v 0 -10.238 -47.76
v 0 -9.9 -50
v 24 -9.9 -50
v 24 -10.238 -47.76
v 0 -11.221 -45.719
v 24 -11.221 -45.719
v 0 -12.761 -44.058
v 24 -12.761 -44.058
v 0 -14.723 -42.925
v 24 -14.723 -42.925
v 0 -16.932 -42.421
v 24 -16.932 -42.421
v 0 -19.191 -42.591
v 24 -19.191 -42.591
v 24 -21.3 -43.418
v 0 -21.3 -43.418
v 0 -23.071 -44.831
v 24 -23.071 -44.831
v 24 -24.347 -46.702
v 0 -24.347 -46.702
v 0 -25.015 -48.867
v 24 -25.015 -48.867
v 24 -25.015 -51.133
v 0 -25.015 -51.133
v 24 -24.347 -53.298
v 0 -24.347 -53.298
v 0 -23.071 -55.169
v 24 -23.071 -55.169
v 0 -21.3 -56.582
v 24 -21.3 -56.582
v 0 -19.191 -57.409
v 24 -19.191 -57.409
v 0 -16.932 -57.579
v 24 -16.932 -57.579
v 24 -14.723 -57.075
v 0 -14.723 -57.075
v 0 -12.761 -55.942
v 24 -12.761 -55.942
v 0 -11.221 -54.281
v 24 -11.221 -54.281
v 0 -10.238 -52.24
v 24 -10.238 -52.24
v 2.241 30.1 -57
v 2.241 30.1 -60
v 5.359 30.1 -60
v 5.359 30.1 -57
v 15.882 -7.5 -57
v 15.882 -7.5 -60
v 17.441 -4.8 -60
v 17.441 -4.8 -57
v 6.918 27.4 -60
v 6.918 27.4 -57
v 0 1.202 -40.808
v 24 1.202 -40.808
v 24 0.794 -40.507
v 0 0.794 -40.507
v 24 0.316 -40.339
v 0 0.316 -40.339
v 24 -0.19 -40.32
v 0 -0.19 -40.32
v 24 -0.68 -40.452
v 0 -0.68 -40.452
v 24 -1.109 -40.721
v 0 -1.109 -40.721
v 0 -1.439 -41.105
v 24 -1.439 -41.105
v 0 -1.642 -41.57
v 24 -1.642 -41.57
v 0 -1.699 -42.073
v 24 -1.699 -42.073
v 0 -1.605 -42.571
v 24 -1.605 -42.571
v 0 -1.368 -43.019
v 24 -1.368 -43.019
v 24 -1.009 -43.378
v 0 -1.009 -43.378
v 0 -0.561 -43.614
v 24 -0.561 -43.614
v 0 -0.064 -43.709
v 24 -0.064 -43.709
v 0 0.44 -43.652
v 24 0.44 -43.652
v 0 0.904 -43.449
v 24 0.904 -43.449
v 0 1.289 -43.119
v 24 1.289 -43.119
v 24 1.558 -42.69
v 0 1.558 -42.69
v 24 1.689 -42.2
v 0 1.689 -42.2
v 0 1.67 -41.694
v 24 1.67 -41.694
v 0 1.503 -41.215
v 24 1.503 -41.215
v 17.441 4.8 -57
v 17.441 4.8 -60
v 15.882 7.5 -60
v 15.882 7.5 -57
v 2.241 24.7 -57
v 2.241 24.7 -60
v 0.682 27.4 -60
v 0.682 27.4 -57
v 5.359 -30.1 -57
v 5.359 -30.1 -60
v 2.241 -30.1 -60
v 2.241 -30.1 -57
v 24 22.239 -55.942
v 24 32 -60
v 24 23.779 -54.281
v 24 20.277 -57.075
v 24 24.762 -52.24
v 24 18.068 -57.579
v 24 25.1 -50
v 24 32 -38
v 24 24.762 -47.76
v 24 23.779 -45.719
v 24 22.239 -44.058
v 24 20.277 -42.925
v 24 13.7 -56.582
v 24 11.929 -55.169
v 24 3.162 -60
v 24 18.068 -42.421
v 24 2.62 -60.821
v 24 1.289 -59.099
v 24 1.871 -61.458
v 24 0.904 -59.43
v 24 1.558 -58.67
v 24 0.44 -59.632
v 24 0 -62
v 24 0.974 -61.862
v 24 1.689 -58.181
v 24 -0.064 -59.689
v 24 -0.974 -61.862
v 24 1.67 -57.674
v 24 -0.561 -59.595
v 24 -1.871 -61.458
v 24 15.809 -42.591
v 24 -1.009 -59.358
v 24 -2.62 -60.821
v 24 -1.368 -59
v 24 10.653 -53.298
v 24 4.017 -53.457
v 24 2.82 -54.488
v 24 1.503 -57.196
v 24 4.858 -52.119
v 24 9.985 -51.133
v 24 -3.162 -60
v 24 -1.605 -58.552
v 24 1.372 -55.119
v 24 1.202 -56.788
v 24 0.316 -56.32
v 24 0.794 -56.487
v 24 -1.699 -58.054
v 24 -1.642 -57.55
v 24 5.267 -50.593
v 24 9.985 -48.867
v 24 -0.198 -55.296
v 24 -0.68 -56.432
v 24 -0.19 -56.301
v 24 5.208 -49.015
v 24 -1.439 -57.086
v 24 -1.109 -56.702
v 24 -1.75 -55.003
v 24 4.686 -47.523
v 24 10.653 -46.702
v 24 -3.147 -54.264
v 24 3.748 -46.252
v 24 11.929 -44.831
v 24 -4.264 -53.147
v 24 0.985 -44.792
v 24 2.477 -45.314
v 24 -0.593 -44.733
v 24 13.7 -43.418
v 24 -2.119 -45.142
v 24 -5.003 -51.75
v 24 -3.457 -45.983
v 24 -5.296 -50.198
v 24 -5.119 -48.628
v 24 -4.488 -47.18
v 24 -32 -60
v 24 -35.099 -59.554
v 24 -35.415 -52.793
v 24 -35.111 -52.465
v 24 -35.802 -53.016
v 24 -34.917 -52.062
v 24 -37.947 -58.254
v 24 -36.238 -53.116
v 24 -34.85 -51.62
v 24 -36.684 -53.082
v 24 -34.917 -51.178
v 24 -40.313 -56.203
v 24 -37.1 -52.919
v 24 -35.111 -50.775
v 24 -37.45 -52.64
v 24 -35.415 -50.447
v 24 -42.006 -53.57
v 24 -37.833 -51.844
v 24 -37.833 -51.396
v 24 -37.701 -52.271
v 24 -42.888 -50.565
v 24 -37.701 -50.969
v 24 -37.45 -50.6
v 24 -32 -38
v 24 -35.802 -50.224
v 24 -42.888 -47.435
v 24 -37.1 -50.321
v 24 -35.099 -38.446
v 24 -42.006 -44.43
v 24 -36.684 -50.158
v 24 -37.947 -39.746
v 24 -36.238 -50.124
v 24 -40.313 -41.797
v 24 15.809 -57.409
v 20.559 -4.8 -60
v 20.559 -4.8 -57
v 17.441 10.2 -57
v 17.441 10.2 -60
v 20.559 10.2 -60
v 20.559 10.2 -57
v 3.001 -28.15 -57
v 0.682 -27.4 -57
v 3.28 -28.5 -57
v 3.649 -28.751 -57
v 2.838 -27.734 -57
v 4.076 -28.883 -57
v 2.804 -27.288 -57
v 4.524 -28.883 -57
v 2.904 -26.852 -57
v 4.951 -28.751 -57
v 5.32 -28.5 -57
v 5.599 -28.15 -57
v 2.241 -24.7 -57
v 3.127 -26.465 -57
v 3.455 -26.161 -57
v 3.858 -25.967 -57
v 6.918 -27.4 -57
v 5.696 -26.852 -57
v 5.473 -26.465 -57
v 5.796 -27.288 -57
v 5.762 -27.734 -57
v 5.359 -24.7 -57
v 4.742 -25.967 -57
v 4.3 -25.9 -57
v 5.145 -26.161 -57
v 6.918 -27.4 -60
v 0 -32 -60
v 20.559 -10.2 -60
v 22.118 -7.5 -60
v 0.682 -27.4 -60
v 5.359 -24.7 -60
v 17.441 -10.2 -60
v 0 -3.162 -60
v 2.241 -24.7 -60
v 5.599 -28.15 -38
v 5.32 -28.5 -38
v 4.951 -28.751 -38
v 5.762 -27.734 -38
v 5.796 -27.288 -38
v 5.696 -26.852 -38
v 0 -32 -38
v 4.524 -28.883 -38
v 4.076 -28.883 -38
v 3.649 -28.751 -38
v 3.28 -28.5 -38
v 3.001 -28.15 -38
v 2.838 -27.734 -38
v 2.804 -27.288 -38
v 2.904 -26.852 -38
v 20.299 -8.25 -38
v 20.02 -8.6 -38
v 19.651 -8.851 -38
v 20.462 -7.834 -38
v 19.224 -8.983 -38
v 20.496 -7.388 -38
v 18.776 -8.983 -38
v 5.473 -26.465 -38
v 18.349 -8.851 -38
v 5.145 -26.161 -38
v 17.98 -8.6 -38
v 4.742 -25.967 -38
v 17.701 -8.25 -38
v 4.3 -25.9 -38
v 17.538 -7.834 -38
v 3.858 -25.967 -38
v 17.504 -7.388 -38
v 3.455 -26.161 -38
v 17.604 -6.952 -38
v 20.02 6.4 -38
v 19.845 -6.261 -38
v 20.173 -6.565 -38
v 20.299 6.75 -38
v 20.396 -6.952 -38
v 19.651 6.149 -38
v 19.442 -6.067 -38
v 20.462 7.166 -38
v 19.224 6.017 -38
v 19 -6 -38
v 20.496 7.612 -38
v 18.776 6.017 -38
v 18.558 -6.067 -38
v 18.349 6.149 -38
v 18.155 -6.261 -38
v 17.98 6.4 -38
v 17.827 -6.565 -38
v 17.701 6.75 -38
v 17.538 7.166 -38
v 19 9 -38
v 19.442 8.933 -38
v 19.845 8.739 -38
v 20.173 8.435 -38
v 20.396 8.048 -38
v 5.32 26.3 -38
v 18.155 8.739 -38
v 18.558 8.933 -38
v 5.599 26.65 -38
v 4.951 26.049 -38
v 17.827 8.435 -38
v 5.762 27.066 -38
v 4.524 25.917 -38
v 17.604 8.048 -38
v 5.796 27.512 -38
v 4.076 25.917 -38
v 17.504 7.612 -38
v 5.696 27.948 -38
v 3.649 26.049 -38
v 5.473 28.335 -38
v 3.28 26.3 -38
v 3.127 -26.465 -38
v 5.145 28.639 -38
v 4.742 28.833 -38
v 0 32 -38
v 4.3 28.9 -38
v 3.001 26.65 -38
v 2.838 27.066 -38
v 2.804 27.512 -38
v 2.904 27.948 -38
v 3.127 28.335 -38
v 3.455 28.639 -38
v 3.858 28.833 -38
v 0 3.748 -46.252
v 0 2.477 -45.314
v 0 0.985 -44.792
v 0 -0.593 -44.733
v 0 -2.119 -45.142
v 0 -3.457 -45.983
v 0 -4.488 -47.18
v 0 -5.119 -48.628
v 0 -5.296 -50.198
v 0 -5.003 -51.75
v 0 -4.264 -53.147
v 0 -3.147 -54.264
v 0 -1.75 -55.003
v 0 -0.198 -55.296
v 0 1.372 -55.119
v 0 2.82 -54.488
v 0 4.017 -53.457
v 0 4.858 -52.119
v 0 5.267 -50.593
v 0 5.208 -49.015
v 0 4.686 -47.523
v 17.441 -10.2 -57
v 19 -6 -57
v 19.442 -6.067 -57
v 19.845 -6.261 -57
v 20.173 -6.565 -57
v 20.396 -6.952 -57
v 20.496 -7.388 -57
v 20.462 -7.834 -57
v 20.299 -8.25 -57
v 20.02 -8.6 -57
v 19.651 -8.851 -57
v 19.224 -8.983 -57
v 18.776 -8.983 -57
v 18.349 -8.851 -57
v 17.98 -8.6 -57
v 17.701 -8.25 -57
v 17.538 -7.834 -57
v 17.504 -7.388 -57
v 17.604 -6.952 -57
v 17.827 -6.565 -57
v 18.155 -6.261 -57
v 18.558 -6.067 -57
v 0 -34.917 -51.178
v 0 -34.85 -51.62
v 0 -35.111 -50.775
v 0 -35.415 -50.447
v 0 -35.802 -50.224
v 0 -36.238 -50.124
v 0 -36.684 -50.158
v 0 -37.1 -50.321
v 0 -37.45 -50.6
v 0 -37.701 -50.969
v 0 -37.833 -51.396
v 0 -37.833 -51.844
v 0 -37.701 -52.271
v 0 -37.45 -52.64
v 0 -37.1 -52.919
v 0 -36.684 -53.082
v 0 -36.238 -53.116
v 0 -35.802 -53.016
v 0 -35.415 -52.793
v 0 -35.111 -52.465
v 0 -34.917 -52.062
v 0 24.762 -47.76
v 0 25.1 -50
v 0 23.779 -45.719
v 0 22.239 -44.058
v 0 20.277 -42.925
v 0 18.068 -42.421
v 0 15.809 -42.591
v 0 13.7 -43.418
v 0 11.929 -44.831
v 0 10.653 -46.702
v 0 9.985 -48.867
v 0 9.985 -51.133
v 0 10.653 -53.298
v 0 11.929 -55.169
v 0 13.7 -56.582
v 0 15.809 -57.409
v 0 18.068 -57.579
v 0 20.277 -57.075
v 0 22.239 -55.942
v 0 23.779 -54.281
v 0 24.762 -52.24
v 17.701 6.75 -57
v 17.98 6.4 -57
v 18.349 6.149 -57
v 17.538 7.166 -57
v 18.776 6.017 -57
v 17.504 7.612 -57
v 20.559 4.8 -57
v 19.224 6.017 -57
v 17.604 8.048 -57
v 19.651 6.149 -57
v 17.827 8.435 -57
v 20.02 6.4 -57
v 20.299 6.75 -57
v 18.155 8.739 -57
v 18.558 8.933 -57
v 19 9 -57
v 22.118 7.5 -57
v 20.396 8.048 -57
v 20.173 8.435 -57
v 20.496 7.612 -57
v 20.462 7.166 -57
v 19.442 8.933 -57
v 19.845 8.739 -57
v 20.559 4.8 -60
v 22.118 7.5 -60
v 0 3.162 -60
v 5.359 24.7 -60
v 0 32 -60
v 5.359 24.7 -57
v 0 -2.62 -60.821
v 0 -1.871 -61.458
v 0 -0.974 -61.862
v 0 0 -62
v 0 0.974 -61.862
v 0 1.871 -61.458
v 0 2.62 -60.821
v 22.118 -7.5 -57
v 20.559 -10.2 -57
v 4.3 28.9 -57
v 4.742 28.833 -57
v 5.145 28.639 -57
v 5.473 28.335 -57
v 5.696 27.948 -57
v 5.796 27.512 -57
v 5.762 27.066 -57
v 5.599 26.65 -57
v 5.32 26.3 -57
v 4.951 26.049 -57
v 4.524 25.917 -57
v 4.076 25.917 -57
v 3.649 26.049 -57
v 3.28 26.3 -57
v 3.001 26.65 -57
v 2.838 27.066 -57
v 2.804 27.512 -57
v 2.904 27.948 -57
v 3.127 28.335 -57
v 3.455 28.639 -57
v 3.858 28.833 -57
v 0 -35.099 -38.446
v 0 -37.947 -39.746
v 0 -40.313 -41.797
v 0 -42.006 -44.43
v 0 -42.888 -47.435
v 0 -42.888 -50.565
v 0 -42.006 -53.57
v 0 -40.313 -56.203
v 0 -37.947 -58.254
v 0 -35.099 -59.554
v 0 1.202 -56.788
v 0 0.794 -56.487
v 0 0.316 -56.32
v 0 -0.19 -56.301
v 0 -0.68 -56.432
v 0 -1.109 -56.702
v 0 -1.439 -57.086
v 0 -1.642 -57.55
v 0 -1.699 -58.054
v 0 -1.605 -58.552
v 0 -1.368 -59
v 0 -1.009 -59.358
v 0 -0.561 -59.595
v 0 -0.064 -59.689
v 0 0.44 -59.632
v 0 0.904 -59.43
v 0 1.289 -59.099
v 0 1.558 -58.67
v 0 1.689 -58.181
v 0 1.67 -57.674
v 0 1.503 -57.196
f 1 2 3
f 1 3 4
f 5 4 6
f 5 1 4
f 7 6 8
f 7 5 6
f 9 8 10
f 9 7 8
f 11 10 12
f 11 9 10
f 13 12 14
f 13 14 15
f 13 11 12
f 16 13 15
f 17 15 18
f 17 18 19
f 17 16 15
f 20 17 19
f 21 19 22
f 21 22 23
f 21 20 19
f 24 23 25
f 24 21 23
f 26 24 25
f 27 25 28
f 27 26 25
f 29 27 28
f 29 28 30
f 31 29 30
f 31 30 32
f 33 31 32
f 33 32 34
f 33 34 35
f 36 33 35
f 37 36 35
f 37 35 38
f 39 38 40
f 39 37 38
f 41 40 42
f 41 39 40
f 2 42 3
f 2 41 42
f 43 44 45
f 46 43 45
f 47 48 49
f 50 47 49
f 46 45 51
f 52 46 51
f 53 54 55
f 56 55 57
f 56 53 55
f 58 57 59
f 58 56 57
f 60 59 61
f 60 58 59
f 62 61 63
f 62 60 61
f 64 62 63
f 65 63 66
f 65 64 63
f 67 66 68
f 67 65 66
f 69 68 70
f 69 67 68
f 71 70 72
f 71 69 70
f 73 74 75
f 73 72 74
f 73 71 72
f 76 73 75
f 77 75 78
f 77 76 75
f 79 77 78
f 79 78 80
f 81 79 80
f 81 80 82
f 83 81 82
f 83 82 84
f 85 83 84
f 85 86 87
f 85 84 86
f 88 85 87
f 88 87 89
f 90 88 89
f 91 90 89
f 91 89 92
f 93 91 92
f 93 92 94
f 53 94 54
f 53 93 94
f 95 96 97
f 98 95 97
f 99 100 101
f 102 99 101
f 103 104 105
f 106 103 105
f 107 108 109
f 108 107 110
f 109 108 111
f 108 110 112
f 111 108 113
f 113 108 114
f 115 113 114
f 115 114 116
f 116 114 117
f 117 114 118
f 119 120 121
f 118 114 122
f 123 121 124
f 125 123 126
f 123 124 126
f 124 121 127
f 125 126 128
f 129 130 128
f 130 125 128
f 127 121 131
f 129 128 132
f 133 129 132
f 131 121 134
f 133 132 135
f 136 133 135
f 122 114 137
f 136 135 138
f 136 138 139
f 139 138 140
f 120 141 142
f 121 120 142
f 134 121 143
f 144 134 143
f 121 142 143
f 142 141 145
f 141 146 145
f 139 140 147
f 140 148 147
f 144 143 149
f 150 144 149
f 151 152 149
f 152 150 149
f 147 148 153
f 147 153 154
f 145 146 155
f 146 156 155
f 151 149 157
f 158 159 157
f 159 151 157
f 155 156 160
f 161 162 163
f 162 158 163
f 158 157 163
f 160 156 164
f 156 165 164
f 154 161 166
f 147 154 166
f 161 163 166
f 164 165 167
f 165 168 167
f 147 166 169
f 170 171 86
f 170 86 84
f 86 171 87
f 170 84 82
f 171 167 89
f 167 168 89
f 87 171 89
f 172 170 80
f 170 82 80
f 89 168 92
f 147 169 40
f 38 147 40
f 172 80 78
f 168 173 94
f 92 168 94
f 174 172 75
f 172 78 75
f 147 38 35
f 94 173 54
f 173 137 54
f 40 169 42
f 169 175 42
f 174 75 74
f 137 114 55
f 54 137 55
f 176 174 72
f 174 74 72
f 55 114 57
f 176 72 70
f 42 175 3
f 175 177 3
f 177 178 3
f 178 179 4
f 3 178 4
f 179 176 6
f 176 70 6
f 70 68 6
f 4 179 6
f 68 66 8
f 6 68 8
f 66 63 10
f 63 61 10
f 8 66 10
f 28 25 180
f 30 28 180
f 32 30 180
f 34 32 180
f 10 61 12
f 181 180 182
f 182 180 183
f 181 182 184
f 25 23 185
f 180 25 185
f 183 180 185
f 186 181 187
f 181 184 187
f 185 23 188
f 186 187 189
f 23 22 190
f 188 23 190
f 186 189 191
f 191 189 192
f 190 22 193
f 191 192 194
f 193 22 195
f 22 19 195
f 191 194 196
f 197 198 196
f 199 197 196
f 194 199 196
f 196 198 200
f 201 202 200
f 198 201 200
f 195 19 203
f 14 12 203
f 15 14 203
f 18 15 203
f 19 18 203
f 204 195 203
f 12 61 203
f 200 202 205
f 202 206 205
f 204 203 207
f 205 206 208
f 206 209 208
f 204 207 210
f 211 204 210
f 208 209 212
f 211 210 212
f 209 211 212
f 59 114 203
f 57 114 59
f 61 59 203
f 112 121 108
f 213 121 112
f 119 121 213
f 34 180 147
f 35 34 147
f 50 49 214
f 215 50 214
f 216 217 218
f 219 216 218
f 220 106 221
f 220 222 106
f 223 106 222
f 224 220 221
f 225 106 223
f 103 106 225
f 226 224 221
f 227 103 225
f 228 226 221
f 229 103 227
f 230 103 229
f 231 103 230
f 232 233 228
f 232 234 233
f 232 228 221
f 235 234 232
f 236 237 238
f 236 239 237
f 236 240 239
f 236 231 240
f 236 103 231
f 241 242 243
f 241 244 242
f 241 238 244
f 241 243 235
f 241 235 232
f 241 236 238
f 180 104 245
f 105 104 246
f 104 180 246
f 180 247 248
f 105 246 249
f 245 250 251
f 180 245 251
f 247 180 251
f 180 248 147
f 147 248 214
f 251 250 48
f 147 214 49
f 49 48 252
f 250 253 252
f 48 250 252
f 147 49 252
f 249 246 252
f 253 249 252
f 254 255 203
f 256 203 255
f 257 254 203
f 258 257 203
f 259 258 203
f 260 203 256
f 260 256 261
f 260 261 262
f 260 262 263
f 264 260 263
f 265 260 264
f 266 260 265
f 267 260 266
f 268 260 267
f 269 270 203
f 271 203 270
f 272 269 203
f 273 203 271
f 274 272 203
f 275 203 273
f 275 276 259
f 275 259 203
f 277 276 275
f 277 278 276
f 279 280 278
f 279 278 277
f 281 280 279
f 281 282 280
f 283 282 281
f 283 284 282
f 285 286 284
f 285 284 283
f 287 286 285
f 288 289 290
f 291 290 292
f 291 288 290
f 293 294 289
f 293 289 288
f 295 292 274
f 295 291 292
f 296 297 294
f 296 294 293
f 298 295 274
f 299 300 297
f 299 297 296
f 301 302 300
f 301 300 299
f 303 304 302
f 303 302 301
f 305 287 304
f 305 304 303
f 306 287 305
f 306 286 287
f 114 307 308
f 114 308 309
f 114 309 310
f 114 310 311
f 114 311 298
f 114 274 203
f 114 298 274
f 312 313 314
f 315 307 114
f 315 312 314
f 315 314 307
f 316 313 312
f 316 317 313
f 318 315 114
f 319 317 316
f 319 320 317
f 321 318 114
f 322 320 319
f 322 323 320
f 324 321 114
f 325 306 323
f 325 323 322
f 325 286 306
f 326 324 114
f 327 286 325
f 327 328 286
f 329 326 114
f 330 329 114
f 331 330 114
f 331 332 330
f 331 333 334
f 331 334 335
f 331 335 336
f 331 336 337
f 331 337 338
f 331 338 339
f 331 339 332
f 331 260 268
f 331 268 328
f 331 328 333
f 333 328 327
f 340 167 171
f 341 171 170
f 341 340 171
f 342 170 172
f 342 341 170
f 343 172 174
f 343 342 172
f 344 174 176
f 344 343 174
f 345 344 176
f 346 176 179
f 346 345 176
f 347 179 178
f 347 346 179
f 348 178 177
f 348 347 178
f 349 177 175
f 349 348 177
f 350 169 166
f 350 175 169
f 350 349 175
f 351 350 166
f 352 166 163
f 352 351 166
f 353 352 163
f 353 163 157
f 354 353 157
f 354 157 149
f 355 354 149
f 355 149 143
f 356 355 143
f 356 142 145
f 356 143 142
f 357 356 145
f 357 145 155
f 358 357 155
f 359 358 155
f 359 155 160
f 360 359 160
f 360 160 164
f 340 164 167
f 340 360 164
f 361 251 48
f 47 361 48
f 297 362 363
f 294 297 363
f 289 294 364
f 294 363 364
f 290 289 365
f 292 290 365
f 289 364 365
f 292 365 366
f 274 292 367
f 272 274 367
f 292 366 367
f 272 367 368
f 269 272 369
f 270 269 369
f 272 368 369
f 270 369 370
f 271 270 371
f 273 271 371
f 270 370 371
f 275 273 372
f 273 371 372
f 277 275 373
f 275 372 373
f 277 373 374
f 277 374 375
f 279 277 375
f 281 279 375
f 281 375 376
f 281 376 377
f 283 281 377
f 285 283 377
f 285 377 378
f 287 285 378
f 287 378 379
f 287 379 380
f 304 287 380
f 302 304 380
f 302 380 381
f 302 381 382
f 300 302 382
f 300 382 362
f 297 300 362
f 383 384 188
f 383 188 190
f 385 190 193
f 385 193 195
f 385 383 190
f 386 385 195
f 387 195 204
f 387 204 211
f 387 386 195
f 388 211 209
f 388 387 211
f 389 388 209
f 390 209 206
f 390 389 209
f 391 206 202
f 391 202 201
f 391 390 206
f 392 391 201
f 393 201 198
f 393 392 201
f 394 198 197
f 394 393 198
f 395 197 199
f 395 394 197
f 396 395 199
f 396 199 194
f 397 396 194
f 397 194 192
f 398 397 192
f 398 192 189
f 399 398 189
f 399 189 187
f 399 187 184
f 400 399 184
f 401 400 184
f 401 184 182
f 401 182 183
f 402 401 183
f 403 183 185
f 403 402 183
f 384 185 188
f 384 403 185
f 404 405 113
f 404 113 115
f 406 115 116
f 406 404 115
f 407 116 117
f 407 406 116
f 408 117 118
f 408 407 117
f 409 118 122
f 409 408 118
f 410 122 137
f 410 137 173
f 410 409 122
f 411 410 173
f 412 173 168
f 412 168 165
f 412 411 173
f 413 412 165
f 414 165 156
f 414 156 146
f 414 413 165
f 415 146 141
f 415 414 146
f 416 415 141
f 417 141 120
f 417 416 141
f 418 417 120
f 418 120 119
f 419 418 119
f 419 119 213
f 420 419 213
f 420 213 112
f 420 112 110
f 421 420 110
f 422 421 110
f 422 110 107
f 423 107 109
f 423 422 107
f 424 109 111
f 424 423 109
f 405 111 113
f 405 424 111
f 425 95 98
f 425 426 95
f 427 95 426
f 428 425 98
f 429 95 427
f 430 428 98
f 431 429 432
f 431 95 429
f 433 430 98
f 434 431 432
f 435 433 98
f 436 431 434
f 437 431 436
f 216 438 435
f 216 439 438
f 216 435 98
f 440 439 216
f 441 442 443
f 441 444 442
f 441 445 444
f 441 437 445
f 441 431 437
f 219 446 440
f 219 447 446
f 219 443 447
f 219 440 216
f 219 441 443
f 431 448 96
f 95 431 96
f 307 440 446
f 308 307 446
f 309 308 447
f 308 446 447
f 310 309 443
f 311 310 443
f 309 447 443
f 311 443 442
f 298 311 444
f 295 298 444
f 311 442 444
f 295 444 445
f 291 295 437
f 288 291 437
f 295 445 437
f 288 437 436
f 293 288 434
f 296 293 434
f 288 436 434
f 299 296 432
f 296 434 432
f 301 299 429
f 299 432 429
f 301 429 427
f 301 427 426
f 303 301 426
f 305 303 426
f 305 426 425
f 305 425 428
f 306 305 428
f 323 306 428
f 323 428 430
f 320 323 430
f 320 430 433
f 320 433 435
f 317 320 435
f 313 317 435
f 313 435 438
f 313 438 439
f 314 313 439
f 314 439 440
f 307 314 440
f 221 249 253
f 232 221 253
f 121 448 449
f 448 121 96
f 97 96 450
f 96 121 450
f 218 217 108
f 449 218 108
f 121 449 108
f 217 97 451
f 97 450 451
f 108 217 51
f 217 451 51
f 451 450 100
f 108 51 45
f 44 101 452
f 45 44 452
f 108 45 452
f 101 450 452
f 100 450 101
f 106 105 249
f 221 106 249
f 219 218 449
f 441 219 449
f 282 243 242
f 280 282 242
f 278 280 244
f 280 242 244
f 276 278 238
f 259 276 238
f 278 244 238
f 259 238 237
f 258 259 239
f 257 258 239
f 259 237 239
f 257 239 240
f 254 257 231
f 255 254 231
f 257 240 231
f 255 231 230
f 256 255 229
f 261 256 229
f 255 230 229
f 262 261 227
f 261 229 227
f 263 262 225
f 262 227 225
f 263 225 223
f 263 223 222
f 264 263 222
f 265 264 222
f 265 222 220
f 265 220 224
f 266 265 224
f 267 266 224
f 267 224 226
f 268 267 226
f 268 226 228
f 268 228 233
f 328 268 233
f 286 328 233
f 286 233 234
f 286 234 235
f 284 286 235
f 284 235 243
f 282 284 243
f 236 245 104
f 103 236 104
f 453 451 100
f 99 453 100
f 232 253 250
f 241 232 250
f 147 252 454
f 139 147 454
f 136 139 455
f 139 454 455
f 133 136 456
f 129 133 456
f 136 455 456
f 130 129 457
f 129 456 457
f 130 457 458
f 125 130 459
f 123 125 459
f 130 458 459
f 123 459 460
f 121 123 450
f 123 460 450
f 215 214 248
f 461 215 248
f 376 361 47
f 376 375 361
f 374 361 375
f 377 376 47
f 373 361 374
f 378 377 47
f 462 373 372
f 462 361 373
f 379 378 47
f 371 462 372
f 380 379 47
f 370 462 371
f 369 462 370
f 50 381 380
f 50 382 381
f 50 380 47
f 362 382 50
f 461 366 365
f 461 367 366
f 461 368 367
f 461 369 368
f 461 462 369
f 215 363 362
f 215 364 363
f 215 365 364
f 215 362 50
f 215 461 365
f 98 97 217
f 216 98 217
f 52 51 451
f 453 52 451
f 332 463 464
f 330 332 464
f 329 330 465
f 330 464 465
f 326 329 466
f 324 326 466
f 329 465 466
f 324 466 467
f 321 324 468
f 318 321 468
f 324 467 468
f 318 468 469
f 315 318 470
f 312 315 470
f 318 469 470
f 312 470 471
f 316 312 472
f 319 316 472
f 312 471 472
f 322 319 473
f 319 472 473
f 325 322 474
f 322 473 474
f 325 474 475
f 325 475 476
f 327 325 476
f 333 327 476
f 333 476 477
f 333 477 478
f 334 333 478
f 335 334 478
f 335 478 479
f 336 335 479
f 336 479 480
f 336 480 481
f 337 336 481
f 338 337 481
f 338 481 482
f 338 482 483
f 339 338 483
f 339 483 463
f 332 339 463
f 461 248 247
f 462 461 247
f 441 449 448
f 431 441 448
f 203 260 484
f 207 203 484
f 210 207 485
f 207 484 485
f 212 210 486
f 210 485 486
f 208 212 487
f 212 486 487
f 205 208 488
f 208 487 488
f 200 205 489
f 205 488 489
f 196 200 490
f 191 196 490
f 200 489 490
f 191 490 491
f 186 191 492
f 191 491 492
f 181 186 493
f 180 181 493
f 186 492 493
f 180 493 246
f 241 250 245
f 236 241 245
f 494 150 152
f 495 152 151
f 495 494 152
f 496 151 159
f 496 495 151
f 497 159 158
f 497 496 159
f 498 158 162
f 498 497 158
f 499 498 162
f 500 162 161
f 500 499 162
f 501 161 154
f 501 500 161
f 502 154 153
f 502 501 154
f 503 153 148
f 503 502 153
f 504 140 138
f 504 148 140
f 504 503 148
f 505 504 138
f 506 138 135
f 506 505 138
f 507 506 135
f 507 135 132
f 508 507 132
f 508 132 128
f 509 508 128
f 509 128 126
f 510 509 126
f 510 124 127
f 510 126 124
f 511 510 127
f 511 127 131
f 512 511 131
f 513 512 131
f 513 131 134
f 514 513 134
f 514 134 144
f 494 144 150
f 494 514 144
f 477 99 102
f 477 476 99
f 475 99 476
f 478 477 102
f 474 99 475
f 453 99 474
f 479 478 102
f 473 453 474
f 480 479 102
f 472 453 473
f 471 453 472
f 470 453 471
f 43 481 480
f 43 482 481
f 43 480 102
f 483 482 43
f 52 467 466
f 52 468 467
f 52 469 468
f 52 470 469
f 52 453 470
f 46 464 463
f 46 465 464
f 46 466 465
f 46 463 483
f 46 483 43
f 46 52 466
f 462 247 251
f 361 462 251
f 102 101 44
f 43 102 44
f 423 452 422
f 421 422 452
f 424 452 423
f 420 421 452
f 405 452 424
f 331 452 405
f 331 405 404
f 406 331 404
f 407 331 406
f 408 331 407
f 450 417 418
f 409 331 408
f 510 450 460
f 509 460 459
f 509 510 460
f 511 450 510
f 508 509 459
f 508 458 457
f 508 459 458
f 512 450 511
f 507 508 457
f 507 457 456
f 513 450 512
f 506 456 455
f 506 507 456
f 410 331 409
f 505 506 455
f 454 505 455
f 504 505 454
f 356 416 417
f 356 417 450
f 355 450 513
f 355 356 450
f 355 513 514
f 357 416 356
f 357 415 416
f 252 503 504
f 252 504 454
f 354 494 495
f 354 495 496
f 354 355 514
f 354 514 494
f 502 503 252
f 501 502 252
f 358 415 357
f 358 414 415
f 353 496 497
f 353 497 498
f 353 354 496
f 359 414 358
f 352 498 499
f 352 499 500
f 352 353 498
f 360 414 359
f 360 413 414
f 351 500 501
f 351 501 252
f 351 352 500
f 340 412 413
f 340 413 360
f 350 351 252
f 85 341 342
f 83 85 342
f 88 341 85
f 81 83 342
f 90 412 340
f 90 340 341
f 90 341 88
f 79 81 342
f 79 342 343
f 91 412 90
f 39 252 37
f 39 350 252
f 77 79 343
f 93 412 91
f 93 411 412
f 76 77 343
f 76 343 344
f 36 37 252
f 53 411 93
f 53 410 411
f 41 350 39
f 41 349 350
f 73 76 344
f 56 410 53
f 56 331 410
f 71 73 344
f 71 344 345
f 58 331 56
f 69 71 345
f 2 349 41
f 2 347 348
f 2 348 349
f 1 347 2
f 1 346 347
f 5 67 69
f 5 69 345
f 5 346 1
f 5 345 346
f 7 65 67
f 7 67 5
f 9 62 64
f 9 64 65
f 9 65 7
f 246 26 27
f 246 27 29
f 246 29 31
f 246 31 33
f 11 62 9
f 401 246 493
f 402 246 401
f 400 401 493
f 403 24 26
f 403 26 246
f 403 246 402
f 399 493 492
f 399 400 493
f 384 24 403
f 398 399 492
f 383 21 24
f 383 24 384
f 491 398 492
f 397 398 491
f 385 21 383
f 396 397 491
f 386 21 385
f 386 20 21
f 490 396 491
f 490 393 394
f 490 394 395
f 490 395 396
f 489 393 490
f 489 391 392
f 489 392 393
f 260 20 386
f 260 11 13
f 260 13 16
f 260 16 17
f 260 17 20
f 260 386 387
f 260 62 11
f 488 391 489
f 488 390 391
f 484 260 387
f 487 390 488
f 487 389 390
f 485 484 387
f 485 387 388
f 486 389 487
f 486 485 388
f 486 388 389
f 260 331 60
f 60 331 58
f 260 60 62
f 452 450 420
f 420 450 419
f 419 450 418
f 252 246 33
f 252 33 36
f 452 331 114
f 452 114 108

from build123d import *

# Parameters (mm, degrees)
SKETCH035_R          = 7.6
SKETCH035_R_2        = 1.5
PAD011_DEPTH         = 24
SKETCH034_R          = 5.3
SKETCH034_R_2        = 1.7
POCKET021_DEPTH      = 24.001
SKETCH036_R          = 1.5
POCKET022_DEPTH      = 22.001
POCKET022_DEPTH_BACK = 2.001
POCKET023_DEPTH      = 3


with BuildPart() as part:
    # Sketch035 → Pad011 (new body)
    with BuildSketch(Plane.YZ):
        with BuildLine():
            Line((-32, 12), (32, 12))
            Line((32, 12), (32, -10))
            Line((3.1622776602, -10), (32, -10))
            ThreePointArc((-3.1622776602, -10), (0, -12), (3.1622776602, -10))
            Line((-32, -10), (-3.1622776602, -10))
            ThreePointArc((-32, 12), (-43, 1), (-32, -10))
        make_face()
        with Locations((17.5, 0)):
            Circle(SKETCH035_R, mode=Mode.SUBTRACT)
        with Locations((-17.5, 0)):
            Circle(SKETCH035_R, mode=Mode.SUBTRACT)
        with Locations((-36.35, -1.62)):
            Circle(SKETCH035_R_2, mode=Mode.SUBTRACT)
    extrude(amount=PAD011_DEPTH)

    # Sketch034 → Pocket021 (cut, through all)
    with BuildSketch(Plane(origin=(0, 0, 0), x_dir=(0, 0.7071067812, 0.7071067812), z_dir=(1, 0, 0))):
        Circle(SKETCH034_R)
        with Locations((5.65, 5.65)):
            Circle(SKETCH034_R_2)
        with Locations((-5.65, -5.65)):
            Circle(SKETCH034_R_2)
    extrude(amount=POCKET021_DEPTH, mode=Mode.SUBTRACT)

    # Sketch036 (on DatumPlane) → Pocket022 (cut, two sides)
    with BuildSketch(Plane.YX.offset(10)) as pocket022_sk:
        with Locations((-7.5, 19)):
            Circle(SKETCH036_R)
        with Locations((7.5, 19)):
            Circle(SKETCH036_R)
        with Locations((27.4, 4.3)):
            Circle(SKETCH036_R)
        with Locations((-27.4, 4.3)):
            Circle(SKETCH036_R)
    extrude(amount=-POCKET022_DEPTH, mode=Mode.SUBTRACT)
    extrude(pocket022_sk.sketch, amount=POCKET022_DEPTH_BACK, mode=Mode.SUBTRACT)

    # Sketch037 (on DatumPlane) → Pocket023 (cut)
    with BuildSketch(Plane.YX.offset(10)):
        Polygon((-24.7, 5.3588457268), (-27.4, 6.9176914536), (-30.1, 5.3588457268), (-30.1, 2.2411542732), (-27.4, 0.6823085464), (-24.7, 2.2411542732), align=None)
        Polygon((24.7, 5.3588457268), (24.7, 2.2411542732), (27.4, 0.6823085464), (30.1, 2.2411542732), (30.1, 5.3588457268), (27.4, 6.9176914536), align=None)
        Polygon((10.2, 20.5588457268), (7.5, 22.1176914536), (4.8, 20.5588457268), (4.8, 17.4411542732), (7.5, 15.8823085464), (10.2, 17.4411542732), align=None)
        Polygon((-7.5, 22.1176914536), (-10.2, 20.5588457268), (-10.2, 17.4411542732), (-7.5, 15.8823085464), (-4.8, 17.4411542732), (-4.8, 20.5588457268), align=None)
    extrude(amount=-POCKET023_DEPTH, mode=Mode.SUBTRACT)


with BuildPart() as part_1:
    # Body006 placement: moved
    add(part.part.moved(Location((0, 0, -50))))


solid = part_1.part
